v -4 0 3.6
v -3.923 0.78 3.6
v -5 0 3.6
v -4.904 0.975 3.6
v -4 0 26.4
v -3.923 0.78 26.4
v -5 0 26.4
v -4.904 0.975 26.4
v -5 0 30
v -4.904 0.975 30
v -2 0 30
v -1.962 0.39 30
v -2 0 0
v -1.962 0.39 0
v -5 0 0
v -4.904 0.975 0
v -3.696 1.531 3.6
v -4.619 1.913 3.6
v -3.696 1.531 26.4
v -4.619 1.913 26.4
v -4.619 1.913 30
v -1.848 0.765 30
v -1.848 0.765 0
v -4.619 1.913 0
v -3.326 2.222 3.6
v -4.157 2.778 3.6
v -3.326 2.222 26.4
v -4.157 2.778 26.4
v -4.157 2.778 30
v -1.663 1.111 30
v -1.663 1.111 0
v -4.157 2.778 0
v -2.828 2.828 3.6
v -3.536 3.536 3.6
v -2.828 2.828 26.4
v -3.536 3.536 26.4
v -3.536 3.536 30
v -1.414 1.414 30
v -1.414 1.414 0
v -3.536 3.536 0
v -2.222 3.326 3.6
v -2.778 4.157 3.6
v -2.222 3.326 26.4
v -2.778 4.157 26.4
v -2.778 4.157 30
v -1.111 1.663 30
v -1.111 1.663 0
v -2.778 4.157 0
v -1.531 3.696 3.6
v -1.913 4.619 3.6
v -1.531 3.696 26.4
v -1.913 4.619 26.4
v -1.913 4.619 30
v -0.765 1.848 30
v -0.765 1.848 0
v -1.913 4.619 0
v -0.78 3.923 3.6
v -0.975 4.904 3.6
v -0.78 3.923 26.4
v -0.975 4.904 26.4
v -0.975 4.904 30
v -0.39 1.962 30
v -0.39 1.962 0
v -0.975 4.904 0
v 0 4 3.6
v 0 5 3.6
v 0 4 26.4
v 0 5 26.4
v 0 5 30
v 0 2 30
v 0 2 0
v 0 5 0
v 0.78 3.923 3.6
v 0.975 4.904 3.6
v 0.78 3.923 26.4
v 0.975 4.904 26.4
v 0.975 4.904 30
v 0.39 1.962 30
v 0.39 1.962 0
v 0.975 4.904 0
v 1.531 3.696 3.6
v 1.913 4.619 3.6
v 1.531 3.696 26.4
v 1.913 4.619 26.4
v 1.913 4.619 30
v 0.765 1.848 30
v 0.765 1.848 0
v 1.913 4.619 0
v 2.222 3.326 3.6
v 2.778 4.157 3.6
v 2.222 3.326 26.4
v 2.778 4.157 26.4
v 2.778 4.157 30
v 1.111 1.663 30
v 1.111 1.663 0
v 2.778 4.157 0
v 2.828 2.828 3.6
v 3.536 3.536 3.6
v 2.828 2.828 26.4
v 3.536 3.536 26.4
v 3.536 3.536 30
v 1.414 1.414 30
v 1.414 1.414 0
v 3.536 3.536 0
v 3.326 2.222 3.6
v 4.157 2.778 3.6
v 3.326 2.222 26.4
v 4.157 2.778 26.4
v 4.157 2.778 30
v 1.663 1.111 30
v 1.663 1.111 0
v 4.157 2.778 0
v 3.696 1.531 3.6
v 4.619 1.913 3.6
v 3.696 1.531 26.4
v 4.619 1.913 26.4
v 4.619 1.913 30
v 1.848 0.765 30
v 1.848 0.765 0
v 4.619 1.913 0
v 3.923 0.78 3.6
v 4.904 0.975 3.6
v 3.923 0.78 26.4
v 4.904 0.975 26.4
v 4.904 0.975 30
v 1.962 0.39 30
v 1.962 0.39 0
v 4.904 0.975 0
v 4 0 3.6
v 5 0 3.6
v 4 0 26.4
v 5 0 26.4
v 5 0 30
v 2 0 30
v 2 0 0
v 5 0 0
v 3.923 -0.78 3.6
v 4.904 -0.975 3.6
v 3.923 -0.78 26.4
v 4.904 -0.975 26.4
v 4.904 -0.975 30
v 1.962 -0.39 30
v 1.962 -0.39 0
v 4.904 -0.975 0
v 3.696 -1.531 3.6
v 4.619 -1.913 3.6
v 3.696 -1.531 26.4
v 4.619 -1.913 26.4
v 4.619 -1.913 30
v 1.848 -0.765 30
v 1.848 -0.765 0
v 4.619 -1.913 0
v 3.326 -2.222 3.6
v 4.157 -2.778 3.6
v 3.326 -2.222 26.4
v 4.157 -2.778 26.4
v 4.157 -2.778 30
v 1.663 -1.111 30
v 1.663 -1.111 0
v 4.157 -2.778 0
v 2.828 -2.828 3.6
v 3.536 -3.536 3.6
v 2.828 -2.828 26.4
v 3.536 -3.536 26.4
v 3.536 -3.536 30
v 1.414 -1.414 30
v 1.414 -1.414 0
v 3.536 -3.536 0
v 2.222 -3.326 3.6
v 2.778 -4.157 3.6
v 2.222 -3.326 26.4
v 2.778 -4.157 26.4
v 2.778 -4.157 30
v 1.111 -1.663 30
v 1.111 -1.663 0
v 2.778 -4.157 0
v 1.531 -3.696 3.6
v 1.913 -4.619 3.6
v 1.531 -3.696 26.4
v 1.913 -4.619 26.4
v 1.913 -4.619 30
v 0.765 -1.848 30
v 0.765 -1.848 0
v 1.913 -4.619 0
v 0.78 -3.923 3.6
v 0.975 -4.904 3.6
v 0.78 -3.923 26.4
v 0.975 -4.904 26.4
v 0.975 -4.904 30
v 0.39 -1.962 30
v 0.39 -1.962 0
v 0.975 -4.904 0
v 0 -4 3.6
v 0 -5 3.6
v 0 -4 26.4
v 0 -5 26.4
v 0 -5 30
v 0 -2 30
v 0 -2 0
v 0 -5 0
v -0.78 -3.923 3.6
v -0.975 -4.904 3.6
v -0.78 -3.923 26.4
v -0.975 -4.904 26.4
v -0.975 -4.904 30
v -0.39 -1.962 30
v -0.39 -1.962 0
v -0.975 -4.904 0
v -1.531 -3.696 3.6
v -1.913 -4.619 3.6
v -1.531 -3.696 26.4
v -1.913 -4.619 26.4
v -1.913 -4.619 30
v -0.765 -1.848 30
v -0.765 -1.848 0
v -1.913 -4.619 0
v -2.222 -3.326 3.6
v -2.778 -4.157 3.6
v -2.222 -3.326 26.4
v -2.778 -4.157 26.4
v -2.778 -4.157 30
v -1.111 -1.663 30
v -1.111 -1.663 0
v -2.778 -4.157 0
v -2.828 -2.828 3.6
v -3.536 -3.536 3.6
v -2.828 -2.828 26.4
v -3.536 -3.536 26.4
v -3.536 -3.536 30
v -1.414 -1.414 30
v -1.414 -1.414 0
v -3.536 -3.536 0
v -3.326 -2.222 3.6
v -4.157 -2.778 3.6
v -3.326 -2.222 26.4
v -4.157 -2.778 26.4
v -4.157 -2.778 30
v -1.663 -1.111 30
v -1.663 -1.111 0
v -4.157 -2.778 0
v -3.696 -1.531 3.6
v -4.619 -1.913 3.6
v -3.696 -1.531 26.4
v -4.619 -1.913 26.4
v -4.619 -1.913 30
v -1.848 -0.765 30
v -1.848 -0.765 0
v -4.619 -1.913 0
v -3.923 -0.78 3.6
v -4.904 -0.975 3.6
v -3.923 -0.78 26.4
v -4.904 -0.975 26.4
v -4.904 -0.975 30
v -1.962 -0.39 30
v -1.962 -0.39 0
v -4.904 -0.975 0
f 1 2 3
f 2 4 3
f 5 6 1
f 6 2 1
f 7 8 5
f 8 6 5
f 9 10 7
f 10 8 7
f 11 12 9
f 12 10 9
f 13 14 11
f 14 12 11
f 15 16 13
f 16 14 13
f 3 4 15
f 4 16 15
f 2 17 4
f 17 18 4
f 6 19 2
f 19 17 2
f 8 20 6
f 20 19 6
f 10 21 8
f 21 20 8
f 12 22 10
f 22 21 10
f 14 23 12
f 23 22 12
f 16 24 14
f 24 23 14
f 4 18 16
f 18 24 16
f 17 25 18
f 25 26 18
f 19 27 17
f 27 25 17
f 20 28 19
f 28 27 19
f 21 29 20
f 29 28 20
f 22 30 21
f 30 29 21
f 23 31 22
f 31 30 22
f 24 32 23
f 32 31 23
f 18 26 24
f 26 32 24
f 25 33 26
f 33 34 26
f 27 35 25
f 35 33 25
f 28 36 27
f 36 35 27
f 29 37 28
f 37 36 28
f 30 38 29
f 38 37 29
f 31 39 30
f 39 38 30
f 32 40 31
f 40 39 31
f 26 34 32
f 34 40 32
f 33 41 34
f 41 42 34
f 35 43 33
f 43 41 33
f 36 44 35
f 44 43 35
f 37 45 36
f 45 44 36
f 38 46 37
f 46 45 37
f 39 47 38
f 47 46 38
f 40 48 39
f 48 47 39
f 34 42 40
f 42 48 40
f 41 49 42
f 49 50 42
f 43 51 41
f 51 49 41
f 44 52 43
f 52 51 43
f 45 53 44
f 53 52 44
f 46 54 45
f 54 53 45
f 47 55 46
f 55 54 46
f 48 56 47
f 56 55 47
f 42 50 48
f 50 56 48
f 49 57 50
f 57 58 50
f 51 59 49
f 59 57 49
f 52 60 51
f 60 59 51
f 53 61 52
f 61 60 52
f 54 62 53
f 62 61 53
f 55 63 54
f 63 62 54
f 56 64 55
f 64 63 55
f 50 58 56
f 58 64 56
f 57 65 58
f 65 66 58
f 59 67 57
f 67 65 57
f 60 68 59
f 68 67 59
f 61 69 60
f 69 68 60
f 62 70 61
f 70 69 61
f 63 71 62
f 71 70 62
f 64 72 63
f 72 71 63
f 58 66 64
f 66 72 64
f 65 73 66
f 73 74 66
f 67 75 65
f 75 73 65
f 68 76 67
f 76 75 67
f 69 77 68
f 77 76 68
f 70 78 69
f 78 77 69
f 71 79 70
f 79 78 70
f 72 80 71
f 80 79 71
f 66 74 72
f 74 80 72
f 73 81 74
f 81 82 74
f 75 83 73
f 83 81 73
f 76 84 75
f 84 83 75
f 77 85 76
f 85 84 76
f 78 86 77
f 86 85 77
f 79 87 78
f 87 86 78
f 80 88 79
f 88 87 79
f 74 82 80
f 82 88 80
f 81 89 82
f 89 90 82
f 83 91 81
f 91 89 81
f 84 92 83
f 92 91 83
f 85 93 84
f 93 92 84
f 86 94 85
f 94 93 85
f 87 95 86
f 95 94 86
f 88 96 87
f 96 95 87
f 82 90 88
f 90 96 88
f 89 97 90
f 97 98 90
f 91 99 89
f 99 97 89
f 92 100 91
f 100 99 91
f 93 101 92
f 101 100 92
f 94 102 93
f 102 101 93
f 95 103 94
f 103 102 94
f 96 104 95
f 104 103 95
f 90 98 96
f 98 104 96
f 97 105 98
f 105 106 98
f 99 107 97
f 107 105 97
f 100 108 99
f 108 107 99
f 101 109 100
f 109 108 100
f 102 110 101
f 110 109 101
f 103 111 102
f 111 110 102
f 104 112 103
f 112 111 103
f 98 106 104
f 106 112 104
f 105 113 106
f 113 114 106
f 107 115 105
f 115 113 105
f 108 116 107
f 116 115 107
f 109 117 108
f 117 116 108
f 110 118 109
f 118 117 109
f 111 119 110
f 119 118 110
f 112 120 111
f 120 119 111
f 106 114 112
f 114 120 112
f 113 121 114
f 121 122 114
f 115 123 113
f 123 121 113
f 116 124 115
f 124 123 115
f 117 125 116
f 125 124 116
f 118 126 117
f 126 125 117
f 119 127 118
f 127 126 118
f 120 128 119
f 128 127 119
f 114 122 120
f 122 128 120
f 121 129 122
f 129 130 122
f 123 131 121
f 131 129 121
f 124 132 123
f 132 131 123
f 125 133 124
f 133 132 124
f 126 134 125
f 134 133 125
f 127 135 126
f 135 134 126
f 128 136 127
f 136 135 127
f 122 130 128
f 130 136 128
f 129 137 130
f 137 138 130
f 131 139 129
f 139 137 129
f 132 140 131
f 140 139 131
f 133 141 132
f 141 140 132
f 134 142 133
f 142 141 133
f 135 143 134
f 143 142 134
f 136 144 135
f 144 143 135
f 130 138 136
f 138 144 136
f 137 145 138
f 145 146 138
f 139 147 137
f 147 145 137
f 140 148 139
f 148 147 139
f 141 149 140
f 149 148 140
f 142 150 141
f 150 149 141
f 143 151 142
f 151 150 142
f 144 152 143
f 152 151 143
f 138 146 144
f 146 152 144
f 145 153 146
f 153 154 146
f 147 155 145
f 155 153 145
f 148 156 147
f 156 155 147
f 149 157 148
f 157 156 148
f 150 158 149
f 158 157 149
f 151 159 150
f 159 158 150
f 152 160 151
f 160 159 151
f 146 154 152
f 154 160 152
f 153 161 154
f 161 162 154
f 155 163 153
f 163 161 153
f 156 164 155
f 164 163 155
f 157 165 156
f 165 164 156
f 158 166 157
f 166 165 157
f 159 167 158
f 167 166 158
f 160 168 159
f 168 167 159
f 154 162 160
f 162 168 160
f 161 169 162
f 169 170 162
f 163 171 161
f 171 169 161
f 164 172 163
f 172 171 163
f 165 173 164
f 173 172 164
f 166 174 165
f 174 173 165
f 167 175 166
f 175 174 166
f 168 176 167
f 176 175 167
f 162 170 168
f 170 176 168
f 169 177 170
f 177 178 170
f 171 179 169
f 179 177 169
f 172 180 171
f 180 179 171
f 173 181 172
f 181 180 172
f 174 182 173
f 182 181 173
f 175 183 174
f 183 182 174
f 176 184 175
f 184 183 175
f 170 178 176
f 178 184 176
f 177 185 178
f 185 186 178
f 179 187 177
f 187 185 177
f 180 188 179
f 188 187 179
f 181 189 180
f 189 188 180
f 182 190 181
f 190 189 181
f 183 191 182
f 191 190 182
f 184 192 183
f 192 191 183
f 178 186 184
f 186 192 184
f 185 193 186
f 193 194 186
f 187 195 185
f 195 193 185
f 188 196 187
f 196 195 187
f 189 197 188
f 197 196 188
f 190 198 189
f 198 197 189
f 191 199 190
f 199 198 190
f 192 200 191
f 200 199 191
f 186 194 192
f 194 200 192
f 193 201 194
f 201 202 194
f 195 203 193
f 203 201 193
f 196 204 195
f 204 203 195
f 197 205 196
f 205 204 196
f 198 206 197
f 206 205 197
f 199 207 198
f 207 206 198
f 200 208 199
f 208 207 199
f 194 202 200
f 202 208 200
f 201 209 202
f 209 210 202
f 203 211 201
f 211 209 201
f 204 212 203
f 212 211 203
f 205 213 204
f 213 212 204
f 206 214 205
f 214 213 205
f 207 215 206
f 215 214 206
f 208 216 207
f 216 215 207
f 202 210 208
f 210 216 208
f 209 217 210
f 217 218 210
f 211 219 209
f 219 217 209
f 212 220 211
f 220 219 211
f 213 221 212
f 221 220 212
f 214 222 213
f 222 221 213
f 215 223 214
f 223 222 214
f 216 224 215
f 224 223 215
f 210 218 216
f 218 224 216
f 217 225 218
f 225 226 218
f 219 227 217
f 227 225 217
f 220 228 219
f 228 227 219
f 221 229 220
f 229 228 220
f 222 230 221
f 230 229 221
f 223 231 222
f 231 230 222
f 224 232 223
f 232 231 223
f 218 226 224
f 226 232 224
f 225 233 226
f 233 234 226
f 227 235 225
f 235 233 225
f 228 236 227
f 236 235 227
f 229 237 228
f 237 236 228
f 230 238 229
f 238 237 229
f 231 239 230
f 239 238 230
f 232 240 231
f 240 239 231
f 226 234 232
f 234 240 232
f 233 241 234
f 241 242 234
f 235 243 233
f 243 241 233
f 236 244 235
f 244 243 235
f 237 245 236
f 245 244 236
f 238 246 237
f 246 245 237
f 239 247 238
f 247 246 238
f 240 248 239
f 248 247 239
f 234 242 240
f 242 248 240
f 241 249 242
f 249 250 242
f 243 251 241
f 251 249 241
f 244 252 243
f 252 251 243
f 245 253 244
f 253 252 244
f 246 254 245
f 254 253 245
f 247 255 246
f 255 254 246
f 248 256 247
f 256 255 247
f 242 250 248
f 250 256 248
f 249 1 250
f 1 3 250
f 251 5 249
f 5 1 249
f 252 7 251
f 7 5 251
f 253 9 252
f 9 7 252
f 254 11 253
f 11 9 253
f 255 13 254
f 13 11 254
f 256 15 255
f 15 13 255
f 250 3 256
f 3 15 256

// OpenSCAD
$fn = 32;

// ----------------------------------------------------------------------
// Profiled standoff: spool spacer, 30 mm long, bore 4 mm
// ----------------------------------------------------------------------

// --- parameters (mm) ---
revolve_angle = 360;      // full turn around the Z axis
profile_points = 8;       // points of the closed outline

profile = [[2, 0], [5, 0], [5, 3.6], [4, 3.6], [4, 26.4], [5, 26.4], [5, 30], [2, 30]];  // single closed polygon, 8 points, counter clockwise

// --- the one profile operation ---
rotate_extrude(angle = revolve_angle) polygon(points = profile);
